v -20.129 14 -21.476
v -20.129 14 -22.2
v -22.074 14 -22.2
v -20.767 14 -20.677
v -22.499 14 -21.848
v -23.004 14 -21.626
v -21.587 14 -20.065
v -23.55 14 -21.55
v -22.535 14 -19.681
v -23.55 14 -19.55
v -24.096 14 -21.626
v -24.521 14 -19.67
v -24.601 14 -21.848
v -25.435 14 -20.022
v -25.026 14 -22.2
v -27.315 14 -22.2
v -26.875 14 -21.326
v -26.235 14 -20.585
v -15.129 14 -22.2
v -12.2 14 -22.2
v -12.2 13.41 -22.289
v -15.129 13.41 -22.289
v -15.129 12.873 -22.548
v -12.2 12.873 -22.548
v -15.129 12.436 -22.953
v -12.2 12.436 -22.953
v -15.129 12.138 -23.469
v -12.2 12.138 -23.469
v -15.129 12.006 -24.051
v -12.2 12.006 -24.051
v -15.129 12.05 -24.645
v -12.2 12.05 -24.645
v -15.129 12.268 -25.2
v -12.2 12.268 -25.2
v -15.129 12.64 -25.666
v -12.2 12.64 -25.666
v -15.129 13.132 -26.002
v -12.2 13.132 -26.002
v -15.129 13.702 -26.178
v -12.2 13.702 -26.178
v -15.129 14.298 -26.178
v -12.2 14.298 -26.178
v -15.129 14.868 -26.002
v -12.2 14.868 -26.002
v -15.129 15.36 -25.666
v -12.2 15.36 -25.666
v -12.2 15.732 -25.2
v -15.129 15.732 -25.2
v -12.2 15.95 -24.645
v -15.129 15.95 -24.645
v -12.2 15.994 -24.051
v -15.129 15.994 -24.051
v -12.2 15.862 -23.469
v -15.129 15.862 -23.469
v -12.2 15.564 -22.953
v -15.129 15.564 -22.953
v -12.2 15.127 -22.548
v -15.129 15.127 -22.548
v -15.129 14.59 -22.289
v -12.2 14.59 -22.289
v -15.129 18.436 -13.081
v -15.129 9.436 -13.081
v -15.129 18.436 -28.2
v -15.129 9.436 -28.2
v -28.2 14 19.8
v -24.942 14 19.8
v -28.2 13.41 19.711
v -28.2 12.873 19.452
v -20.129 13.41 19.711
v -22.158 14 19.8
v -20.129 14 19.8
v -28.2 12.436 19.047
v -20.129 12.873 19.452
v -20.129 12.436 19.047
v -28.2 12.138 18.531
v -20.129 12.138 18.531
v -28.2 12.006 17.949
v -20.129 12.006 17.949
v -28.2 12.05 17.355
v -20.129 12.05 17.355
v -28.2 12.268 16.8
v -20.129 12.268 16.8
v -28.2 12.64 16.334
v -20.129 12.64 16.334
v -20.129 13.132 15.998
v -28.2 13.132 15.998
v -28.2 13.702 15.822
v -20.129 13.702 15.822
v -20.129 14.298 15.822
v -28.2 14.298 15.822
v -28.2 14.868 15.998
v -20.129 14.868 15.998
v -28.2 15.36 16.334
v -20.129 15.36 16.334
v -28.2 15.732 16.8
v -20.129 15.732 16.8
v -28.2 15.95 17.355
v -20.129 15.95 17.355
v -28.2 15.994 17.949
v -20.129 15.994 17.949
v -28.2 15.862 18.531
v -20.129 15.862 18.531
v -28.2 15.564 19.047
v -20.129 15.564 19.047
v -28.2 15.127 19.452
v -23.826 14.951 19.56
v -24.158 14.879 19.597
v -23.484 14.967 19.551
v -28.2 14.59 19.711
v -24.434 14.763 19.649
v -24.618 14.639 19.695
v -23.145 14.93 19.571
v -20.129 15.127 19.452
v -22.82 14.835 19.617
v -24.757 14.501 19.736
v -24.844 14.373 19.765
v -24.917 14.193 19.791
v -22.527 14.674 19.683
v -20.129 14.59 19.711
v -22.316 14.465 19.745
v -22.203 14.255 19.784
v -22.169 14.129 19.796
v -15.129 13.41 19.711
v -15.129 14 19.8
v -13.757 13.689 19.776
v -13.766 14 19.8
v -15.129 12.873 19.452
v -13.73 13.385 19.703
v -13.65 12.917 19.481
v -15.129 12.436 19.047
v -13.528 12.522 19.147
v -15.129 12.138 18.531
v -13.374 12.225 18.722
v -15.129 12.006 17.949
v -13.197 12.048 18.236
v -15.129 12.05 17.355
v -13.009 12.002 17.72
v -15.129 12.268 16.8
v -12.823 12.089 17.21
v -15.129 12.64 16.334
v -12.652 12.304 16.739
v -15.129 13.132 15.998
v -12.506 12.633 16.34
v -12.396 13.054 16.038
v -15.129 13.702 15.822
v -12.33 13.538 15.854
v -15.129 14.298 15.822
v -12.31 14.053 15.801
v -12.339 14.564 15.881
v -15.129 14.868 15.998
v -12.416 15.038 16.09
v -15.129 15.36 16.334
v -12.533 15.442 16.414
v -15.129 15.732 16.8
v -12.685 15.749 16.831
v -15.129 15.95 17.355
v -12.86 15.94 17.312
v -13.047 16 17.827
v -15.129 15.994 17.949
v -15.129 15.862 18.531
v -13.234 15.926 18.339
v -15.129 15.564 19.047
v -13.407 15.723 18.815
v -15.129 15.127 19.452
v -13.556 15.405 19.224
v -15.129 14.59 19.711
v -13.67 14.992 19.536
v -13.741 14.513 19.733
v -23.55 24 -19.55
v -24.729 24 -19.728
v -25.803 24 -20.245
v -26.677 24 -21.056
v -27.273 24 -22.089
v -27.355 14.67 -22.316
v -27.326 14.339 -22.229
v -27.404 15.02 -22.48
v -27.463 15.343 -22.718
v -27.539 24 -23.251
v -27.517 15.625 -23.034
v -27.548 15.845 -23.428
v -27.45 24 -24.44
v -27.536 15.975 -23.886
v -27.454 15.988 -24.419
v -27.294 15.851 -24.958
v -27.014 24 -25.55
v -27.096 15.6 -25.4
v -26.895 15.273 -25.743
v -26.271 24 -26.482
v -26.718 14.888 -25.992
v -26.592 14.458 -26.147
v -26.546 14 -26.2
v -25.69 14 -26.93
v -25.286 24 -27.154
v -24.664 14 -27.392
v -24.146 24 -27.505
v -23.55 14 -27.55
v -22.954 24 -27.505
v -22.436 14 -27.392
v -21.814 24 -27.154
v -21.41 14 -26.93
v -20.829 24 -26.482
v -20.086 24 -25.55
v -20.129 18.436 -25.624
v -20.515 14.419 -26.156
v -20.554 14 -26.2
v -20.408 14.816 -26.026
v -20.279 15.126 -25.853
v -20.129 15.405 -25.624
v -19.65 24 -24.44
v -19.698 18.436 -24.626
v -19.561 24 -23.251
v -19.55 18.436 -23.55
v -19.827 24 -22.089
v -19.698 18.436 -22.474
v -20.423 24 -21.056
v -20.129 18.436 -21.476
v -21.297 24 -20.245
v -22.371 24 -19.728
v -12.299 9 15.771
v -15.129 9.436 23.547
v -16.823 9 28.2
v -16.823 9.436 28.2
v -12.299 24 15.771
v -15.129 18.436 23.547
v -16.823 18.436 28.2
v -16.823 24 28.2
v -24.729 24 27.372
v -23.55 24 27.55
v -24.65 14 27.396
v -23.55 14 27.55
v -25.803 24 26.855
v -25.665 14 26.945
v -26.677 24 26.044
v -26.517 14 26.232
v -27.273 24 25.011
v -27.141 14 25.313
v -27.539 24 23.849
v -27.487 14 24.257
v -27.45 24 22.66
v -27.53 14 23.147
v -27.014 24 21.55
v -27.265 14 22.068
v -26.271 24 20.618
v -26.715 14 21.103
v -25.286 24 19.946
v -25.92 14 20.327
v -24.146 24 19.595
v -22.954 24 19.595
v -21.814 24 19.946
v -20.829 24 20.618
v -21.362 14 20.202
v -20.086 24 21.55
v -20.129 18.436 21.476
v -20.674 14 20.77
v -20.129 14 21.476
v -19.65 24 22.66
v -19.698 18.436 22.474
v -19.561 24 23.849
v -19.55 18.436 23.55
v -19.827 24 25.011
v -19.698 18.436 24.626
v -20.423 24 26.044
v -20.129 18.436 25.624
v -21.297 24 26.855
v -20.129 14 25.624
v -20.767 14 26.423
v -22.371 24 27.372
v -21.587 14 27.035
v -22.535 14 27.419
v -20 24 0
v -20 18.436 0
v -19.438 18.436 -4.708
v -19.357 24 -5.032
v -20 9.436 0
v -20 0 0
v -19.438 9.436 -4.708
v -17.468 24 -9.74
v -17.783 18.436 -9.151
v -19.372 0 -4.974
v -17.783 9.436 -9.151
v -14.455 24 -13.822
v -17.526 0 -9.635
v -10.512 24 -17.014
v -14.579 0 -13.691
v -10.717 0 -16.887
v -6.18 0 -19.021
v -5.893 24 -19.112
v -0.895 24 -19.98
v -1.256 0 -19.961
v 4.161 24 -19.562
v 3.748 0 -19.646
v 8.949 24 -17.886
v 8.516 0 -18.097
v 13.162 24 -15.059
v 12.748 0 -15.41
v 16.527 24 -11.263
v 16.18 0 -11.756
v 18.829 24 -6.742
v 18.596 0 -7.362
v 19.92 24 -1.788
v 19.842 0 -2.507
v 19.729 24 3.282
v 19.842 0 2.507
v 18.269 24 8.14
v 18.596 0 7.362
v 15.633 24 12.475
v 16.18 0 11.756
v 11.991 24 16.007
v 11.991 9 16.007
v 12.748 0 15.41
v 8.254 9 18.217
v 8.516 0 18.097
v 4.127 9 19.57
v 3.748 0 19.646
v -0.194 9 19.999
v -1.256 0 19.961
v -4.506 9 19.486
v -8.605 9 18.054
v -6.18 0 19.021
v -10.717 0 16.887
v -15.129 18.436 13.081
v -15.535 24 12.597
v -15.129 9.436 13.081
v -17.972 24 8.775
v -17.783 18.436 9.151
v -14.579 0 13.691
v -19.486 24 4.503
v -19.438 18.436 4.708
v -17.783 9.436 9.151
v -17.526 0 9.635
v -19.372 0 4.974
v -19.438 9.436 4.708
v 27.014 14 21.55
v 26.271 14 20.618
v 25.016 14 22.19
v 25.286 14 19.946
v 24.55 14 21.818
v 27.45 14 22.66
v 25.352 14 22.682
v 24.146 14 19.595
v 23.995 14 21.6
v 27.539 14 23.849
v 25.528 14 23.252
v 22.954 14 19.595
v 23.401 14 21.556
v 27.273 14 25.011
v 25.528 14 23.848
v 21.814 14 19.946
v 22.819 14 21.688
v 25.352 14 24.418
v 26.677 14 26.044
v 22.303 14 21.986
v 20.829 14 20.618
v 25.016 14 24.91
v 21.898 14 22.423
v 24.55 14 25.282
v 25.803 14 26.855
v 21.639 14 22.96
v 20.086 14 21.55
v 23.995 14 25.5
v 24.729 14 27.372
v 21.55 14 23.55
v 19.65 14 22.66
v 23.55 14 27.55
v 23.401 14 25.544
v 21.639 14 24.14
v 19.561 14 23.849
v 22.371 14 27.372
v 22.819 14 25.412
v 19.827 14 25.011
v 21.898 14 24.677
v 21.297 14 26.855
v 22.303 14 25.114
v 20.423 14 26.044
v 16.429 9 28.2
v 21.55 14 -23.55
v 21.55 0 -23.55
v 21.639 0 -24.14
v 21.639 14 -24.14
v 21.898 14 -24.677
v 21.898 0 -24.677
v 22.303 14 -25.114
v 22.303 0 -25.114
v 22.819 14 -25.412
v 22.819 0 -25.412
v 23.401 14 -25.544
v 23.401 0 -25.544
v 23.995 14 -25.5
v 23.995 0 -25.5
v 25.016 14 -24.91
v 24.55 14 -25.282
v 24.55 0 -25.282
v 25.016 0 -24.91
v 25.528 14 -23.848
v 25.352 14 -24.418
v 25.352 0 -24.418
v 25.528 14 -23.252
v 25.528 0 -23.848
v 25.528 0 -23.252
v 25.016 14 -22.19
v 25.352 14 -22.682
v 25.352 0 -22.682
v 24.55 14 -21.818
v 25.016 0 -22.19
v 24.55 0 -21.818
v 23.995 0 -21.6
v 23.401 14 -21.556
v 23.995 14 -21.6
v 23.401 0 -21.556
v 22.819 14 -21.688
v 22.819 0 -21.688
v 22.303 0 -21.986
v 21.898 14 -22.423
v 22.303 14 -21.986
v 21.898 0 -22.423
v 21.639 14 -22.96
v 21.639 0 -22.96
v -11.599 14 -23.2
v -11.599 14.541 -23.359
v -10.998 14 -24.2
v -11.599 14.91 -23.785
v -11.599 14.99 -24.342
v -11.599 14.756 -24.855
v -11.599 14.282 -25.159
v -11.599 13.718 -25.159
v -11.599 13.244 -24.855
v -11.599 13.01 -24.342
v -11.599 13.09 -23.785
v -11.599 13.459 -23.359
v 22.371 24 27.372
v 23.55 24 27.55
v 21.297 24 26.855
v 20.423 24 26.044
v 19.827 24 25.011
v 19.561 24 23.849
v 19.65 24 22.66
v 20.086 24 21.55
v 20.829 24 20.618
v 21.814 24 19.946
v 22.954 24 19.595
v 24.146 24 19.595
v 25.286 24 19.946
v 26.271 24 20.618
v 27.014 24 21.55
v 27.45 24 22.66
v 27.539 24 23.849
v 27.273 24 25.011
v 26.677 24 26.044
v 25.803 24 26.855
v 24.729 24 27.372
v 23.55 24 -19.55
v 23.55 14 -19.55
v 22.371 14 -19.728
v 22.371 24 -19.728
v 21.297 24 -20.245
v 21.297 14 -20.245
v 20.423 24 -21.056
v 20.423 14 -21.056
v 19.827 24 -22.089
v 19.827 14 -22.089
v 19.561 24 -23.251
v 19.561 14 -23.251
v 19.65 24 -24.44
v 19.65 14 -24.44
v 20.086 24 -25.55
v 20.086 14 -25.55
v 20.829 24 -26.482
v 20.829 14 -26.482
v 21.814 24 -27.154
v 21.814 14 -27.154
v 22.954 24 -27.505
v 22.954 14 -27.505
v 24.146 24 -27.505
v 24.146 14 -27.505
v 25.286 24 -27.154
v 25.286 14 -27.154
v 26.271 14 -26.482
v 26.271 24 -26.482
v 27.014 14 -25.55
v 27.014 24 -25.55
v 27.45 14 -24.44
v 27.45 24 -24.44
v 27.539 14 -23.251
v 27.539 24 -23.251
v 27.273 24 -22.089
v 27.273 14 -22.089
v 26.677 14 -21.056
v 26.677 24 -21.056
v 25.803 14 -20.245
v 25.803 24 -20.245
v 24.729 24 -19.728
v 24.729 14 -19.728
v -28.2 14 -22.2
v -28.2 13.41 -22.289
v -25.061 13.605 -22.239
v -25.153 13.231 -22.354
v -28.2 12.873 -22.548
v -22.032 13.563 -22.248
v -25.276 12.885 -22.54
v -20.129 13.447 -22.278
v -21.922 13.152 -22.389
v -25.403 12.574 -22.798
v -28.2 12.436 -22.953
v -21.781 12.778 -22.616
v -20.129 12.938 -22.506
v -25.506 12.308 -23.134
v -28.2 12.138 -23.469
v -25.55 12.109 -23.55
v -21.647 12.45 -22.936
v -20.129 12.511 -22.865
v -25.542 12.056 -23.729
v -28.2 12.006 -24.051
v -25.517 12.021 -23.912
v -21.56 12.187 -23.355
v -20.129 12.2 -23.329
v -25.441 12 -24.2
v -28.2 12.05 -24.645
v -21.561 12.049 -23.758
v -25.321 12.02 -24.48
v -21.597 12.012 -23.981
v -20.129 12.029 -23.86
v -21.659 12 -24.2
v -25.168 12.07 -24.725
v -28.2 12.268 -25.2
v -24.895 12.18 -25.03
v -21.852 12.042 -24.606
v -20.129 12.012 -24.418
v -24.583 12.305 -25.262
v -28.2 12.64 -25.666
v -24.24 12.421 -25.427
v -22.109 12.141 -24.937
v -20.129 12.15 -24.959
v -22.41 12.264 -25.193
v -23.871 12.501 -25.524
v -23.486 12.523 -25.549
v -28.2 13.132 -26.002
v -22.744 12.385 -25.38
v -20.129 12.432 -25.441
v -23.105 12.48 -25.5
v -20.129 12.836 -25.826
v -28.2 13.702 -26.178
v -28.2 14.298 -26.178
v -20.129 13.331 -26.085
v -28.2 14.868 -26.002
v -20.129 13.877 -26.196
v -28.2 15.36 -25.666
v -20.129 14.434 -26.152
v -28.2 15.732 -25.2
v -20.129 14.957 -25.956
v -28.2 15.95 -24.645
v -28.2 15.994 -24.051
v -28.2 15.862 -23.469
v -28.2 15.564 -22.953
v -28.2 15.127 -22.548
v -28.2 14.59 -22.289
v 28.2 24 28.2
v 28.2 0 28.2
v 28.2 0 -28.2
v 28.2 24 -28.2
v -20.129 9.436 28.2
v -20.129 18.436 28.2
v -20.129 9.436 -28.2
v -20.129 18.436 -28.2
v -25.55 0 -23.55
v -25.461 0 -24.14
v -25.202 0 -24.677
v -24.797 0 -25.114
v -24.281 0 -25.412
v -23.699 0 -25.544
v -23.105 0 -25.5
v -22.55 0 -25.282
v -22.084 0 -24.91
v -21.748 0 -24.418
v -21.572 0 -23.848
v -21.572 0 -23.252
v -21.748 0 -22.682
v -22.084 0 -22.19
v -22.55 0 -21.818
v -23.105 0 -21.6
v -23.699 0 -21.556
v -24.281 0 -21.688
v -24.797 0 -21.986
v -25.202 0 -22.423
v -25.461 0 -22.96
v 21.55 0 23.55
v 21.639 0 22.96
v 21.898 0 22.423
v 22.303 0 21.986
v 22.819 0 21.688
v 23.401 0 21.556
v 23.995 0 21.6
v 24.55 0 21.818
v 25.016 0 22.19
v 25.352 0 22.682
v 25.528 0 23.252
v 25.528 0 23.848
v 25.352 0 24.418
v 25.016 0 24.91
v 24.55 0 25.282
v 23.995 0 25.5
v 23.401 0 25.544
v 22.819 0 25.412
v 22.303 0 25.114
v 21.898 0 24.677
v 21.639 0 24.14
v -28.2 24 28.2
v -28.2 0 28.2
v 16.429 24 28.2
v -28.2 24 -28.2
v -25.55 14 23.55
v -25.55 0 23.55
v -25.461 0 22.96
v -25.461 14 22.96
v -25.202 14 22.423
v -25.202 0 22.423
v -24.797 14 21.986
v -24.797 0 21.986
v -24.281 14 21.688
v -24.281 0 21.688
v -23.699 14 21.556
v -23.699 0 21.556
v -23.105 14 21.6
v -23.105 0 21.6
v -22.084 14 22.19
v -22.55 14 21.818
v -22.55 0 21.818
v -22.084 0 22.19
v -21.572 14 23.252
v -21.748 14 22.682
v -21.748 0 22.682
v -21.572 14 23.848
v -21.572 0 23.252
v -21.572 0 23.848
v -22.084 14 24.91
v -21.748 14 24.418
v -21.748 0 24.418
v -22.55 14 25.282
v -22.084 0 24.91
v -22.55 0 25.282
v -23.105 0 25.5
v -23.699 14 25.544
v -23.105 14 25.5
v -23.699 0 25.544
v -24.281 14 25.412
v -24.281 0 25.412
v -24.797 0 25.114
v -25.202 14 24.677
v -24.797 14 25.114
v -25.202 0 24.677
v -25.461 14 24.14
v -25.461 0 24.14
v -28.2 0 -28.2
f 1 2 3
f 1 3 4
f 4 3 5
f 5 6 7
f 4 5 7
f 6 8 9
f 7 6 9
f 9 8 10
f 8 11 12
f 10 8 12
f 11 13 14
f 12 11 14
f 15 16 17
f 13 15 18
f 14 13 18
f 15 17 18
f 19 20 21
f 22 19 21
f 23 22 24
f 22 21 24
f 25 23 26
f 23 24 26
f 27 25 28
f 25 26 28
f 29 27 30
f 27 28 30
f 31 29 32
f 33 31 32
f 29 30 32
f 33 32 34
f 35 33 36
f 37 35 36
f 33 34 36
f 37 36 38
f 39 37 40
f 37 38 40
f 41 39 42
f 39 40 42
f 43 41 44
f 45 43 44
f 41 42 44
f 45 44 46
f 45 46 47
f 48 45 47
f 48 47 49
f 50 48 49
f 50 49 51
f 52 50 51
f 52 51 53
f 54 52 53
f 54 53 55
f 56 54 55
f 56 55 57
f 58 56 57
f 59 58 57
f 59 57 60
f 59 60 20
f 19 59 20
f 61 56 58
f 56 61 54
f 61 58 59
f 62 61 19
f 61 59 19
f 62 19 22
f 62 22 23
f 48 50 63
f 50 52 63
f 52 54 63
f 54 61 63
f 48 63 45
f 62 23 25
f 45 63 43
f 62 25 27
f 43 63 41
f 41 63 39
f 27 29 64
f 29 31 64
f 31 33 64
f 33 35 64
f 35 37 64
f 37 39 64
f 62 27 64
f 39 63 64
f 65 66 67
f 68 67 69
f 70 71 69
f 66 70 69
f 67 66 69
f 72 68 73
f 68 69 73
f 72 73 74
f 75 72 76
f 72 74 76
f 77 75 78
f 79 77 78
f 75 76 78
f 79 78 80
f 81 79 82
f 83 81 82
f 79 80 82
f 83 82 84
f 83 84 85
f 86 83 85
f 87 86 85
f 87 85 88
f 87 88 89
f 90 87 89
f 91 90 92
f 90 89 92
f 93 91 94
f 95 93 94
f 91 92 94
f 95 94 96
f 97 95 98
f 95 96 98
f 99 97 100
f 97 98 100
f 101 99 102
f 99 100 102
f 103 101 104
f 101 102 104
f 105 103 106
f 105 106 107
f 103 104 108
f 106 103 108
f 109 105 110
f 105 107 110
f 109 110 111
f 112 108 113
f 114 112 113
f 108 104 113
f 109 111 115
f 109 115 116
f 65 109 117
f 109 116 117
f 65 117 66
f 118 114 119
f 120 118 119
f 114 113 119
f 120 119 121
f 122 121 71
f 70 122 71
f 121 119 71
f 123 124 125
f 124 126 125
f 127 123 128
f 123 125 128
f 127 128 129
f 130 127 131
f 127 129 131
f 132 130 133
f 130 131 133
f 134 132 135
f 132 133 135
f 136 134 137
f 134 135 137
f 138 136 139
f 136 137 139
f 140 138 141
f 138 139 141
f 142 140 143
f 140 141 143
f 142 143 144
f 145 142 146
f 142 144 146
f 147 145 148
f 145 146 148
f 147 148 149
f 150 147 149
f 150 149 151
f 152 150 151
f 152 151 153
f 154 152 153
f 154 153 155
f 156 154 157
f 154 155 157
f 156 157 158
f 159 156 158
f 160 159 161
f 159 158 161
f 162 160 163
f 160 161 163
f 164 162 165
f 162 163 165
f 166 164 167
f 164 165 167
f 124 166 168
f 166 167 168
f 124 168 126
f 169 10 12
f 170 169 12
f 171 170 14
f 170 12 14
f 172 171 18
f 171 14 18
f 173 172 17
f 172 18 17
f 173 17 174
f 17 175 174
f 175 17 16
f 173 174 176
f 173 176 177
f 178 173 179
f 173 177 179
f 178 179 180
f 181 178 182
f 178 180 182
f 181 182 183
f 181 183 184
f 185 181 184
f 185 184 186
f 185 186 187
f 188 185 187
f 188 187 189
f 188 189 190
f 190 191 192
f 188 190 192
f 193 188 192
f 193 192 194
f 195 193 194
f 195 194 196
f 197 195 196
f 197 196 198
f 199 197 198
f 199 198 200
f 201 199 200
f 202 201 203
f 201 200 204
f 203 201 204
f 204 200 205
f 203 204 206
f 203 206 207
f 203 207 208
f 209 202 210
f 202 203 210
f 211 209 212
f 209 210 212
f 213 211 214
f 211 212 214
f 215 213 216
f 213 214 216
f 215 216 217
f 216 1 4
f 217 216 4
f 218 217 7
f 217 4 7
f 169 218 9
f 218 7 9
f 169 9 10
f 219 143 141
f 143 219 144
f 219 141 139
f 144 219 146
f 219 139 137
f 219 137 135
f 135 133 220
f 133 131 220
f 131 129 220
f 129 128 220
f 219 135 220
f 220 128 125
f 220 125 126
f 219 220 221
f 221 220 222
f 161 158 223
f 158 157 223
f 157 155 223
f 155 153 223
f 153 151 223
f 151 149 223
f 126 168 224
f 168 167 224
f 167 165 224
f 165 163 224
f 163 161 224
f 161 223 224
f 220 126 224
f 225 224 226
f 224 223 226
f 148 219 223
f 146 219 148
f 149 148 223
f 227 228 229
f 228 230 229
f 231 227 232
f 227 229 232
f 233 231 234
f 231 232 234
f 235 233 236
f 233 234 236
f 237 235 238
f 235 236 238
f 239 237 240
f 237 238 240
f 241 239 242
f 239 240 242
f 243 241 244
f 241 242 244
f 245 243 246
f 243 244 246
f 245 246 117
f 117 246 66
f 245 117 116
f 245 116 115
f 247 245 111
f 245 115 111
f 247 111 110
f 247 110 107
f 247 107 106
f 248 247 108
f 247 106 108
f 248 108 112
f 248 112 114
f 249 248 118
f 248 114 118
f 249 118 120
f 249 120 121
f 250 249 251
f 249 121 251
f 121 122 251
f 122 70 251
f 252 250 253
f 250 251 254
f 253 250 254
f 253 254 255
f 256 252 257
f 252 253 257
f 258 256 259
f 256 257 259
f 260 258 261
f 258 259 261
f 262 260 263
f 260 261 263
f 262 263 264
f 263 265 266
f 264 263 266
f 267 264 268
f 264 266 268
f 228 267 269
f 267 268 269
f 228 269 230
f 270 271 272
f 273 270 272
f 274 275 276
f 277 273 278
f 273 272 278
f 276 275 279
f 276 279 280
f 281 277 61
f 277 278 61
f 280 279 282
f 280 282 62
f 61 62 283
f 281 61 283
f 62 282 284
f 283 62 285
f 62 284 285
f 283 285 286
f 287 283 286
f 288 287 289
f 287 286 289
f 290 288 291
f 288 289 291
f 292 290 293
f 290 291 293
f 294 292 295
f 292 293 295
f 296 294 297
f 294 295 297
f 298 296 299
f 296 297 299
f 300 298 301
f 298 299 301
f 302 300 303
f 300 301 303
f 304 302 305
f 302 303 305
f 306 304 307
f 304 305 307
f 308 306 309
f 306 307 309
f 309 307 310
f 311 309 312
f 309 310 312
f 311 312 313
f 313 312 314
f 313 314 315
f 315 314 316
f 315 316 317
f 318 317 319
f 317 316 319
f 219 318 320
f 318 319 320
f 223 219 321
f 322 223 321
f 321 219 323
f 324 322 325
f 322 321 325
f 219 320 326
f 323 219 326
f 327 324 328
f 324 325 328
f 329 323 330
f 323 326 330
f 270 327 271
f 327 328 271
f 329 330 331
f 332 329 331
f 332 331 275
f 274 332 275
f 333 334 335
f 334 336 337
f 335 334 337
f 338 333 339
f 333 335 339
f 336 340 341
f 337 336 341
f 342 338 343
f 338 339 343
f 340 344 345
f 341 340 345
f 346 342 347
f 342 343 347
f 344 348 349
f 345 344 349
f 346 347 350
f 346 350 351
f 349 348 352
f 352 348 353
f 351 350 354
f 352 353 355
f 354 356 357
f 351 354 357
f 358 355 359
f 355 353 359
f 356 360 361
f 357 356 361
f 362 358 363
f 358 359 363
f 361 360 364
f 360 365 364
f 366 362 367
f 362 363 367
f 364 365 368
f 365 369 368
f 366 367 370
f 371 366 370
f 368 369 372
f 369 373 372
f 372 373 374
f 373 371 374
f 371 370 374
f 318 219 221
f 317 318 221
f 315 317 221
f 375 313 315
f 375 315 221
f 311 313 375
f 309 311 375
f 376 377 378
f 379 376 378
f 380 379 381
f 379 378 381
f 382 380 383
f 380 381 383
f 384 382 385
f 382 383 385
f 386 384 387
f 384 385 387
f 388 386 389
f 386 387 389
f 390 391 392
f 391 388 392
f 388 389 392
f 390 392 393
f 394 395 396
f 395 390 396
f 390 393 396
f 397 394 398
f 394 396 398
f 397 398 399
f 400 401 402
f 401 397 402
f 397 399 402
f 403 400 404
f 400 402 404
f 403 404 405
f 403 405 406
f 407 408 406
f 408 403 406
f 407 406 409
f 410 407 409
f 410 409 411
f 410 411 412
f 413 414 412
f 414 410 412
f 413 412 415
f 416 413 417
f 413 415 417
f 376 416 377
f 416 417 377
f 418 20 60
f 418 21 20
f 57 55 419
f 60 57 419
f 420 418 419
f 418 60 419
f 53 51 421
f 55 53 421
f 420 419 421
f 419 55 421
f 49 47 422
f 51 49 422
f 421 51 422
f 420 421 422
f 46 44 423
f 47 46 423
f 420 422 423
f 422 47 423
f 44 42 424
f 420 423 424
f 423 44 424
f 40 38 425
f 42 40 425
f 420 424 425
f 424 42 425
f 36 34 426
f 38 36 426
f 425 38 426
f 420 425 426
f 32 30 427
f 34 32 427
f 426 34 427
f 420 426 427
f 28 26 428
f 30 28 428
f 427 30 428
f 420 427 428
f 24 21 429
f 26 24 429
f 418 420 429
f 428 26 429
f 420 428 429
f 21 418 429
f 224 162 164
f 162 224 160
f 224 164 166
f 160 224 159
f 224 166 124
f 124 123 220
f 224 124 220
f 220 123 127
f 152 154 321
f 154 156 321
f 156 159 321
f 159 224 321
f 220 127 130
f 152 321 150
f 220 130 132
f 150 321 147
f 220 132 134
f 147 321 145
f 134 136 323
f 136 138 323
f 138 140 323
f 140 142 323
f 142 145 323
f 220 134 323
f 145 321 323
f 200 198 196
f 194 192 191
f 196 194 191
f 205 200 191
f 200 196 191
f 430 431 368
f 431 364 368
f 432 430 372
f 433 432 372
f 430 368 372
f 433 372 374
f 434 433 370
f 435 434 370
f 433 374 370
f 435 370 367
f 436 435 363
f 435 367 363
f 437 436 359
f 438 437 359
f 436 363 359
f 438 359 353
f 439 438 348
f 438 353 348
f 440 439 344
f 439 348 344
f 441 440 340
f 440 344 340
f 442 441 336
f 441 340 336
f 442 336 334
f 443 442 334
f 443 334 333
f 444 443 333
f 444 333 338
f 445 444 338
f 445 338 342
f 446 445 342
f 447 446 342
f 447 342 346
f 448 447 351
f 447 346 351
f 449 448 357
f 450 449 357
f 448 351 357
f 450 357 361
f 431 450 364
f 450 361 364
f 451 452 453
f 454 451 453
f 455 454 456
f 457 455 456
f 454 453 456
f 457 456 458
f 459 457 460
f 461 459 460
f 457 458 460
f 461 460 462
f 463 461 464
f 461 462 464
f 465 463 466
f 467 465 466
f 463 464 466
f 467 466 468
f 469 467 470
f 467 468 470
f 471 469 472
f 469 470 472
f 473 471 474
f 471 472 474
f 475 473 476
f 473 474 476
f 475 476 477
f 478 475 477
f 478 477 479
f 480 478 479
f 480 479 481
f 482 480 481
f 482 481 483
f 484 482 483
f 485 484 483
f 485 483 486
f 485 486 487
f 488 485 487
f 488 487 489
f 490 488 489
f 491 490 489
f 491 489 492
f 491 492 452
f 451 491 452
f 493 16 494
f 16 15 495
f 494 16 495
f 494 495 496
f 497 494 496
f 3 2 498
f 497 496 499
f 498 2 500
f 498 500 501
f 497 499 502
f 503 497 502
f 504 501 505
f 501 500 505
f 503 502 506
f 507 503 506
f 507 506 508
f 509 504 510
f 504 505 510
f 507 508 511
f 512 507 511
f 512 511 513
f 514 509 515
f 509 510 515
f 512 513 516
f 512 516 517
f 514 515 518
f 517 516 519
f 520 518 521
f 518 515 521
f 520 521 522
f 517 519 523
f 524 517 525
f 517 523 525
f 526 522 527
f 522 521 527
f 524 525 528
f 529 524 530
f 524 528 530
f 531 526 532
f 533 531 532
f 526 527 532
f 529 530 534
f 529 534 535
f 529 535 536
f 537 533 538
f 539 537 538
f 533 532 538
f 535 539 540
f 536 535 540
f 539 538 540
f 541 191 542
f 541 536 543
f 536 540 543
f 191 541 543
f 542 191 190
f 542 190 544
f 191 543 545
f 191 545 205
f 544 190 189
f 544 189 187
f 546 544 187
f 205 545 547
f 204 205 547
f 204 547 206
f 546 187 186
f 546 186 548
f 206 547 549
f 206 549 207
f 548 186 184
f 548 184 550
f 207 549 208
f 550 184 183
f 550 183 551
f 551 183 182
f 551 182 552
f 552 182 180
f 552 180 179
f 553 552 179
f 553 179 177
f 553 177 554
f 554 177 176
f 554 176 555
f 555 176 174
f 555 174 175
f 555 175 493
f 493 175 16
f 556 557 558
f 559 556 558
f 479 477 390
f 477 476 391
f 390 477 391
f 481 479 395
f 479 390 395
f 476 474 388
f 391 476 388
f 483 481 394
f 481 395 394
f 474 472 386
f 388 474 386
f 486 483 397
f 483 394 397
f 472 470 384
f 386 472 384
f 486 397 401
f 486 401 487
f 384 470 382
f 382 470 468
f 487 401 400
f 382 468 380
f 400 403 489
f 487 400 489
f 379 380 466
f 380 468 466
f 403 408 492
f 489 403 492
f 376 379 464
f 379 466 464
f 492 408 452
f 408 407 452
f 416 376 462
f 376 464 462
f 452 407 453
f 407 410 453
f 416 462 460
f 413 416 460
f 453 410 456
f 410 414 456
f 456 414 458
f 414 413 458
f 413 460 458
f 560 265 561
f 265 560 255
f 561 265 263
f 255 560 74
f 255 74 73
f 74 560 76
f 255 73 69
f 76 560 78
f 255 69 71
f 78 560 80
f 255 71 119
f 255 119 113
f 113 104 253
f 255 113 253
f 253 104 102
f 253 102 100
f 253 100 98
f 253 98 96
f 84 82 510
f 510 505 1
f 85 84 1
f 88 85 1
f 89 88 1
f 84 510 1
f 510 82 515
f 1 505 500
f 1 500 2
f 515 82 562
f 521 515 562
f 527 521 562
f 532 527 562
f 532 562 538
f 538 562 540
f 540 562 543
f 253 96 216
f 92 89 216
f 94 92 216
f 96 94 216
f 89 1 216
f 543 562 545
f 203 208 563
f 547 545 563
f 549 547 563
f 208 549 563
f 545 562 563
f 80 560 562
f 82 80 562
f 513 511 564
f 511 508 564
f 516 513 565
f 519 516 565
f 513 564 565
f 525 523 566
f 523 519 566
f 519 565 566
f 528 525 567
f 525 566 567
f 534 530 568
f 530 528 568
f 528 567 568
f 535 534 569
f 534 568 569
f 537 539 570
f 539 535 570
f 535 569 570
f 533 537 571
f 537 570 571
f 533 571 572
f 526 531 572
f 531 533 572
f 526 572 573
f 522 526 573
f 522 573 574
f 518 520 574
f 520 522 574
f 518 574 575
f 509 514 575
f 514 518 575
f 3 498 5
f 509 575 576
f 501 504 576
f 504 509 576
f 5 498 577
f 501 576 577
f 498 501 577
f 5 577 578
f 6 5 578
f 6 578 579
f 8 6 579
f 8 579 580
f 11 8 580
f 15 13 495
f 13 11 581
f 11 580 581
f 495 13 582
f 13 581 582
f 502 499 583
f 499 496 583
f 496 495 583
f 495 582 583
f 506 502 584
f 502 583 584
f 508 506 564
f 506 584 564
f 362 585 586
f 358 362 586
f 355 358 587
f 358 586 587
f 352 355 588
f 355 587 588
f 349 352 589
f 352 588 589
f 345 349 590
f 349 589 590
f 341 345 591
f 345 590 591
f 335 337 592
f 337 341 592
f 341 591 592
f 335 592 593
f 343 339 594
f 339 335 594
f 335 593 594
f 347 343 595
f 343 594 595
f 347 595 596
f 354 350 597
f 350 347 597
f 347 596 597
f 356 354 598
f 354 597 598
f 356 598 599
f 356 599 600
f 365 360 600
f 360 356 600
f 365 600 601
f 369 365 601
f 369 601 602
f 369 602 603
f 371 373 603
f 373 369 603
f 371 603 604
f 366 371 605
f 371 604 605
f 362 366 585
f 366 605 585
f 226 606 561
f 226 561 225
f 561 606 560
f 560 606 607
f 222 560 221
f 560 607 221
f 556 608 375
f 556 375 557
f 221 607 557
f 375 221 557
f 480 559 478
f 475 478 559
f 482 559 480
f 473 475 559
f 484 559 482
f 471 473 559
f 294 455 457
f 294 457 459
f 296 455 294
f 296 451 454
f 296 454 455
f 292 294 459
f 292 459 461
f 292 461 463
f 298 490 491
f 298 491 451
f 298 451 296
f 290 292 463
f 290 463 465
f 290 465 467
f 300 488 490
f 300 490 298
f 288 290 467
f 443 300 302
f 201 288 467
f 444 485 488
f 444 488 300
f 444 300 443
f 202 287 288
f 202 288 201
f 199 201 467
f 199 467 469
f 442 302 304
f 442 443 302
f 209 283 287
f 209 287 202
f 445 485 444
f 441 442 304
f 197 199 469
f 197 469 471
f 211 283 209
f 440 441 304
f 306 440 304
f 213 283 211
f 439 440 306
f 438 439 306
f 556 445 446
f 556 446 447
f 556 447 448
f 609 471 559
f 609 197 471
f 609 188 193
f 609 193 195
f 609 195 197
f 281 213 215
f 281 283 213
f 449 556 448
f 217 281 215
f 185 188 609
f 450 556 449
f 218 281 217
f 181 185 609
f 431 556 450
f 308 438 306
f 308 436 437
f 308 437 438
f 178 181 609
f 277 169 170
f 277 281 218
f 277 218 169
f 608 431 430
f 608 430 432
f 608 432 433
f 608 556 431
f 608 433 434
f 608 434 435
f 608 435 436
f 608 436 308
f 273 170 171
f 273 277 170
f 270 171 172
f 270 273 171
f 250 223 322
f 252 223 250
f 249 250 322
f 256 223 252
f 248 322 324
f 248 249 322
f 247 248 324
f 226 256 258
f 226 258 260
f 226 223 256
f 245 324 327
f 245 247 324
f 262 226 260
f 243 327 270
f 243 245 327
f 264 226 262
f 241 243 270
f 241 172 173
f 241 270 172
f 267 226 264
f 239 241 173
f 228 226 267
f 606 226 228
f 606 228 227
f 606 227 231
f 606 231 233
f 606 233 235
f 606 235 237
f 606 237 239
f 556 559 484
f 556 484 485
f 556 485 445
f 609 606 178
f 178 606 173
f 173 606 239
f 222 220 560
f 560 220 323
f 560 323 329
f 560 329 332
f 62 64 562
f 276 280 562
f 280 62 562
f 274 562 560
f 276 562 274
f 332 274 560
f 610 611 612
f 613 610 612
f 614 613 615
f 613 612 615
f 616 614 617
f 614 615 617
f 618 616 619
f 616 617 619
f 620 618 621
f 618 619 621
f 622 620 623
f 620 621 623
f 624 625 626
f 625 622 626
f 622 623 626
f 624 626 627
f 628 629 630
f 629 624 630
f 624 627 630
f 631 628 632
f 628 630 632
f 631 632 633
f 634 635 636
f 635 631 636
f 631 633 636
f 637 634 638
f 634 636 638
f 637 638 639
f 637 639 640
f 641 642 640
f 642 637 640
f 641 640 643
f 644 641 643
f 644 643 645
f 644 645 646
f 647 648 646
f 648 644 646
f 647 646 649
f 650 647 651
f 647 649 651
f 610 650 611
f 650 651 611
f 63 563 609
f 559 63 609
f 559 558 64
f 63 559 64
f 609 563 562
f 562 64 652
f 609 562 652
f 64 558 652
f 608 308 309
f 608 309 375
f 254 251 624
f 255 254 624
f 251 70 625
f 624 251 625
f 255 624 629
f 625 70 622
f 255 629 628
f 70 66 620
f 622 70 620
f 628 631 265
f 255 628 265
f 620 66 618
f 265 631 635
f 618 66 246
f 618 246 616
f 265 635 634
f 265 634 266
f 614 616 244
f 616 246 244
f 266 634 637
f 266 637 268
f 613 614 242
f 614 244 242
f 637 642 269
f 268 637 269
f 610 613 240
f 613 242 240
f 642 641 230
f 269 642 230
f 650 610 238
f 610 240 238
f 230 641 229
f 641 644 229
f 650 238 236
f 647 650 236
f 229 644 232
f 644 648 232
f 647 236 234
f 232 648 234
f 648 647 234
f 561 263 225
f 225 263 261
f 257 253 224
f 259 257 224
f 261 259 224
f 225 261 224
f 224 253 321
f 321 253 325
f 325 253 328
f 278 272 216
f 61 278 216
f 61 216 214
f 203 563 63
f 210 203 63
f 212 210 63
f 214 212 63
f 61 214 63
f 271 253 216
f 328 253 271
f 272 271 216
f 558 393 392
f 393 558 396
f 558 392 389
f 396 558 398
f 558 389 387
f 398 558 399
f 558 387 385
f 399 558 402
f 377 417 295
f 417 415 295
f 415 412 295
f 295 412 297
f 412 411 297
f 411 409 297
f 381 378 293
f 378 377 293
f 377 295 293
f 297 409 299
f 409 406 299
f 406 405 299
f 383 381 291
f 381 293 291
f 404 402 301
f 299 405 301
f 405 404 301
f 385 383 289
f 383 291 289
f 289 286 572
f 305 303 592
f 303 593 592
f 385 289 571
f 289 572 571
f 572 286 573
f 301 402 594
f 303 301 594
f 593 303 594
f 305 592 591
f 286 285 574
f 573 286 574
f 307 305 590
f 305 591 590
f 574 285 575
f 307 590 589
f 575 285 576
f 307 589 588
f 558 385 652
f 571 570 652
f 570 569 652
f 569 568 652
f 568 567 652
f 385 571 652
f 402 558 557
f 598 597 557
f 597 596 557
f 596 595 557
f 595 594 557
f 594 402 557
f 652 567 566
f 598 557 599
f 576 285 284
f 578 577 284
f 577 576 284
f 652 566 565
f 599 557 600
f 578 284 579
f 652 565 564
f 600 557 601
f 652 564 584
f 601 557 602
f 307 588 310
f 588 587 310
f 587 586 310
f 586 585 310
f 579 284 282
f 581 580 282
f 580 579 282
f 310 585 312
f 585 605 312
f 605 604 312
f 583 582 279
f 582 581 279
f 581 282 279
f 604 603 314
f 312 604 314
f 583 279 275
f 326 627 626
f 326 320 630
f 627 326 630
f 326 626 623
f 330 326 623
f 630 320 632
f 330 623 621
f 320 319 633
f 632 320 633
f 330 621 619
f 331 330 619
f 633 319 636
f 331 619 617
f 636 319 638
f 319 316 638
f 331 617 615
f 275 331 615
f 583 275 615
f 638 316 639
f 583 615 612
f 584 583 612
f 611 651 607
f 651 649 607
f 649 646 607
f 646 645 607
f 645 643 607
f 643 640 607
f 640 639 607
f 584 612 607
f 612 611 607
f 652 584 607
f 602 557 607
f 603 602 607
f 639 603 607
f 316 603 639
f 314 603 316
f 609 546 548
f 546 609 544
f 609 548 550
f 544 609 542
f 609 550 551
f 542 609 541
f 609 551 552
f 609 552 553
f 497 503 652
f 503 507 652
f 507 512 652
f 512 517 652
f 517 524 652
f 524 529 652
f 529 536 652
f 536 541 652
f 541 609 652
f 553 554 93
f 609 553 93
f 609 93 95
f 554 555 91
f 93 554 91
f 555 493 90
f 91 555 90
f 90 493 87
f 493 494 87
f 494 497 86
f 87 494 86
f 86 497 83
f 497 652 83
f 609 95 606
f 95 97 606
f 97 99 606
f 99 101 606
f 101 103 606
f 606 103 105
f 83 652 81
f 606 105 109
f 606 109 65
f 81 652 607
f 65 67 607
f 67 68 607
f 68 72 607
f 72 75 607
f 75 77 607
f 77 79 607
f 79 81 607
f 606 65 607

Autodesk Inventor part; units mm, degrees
ref_plane "YZ Plane" through (0, 0, 0) normal (1, 0, 0) x (0, 1, 0)
ref_plane "XZ Plane" through (0, 0, 0) normal (0, 1, 0) x (-1, 0, 0)
ref_plane "XY Plane" through (0, 0, 0) normal (0, 0, 1) x (1, 0, 0)
sketch "Sketch1" plane through (0, 0, 0) normal (0, 1, 0) x (-1, 0, 0)
  line L0 (-28.2, -28.2) -> (28.2, -28.2)
  line L1 (28.2, -28.2) -> (28.2, 28.2)
  line L2 (28.2, 28.2) -> (-28.2, 28.2)
  line L3 (-28.2, 28.2) -> (-28.2, -28.2)
  line L4 (-28.2, -28.2) -> (28.2, 28.2) construction
  line L5 (28.2, -28.2) -> (-28.2, 28.2) construction
  line L6 (-23.55, 23.55) -> (23.55, 23.55) construction
  line L7 (23.55, 23.55) -> (23.55, -23.55) construction
  line L8 (23.55, -23.55) -> (-23.55, -23.55) construction
  line L9 (-23.55, -23.55) -> (-23.55, 23.55) construction
  line L10 (-23.55, 23.55) -> (23.55, -23.55) construction
  line L11 (23.55, 23.55) -> (-23.55, -23.55) construction
  circle A0 centre (23.55, 23.55) radius 2
  circle A1 centre (23.55, -23.55) radius 2
  circle A2 centre (-23.55, -23.55) radius 2
  circle A3 centre (-23.55, 23.55) radius 2
  circle A4 centre (0, 0) radius 20
  line L12 (28.2, 28.2) -> (-28.2, 28.2)
  line L13 (-28.2, 28.2) -> (-28.2, 38.2)
  line L14 (-28.2, 38.2) -> (28.2, 38.2)
  line L15 (28.2, 38.2) -> (28.2, 28.2)
  dimension "d0" = 56.4
  dimension "d1" = 56.4
  dimension "d2" = 47.1
  dimension "d3" = 47.1
  dimension "d4" = 4
  dimension "d5" = 4
  dimension "d6" = 4
  dimension "d7" = 4
  dimension "d8" = 40
  dimension "d16" = 10
extrude "Extrusion1" add sketch "Sketch1" along normal blind 24 contours L3 L2 L1 L0
sketch "Sketch2" plane through (0, 24, 0) normal (0, 1, 0) x (1, 0, 0)
  circle A0 centre (0, 0) radius 20 projected
  circle A1 centre (23.55, -23.55) radius 2 projected
  circle A2 centre (23.55, 23.55) radius 2 projected
  circle A3 centre (-23.55, 23.55) radius 2 projected
  circle A4 centre (-23.55, -23.55) radius 2 projected
  line L0 (28.2, 28.2) -> (-28.2, 28.2) projected
  line L1 (-28.2, 28.2) -> (-28.2, -28.2) projected
  line L2 (28.2, -28.2) -> (28.2, 28.2) projected
  circle A5 centre (0, 0) radius 6.5
  line L3 (-6.4978, 0.1686) -> (-26.2939, -54.2207)
  line L4 (-6.4978, 0.1686) -> (51.3822, 0.1686) construction
  line L5 (6.4521, -0.788) -> (25.9, -54.2207)
  line L6 (6.4521, -0.788) -> (63.314, -0.788) construction
  line L7 (25.9, -54.2207) -> (-26.2939, -54.2207)
  line L8 (-28.2, -28.2) -> (28.2, -28.2) projected
  dimension "d11" = 110
  dimension "d12" = 70
  dimension "d13" = 13
extrude "Extrusion2" cut sketch "Sketch2" against normal blind 15 contours L3 A5 L5 A0 | A0 L5 L8 L3 | A5 | L8 L5 L7 L3 picked at (-8.2958, -12.9873)
sketch "Sketch3" plane through (-28.2, 0, -28.2) normal (-1, 0, 0) x (0, 0, 1)
  line L0 (0, 0) -> (56.4, 0) projected
  line L1 (0, 24) -> (56.4, 24) projected
  line L2 (0, 0) -> (0, 24) projected
  line L3 (49.75, 24) -> (53.75, 24) projected
  line L4 (53.75, 0) -> (49.75, 0) projected
  line L5 (2.65, 24) -> (6.65, 24) projected
  line L6 (6.65, 0) -> (2.65, 0) projected
  line L7 (6.65, 0) -> (6.65, 24) projected
  line L8 (2.65, 0) -> (2.65, 24) projected
  line L9 (49.75, 0) -> (49.75, 24) projected
  line L10 (53.75, 0) -> (53.75, 24) projected
  line L11 (56.4, 0) -> (56.4, 24) projected
  point P0 (28.2, 0)
sketch "Sketch4" plane through (-28.2, 0, -28.2) normal (-1, 0, 0) x (0, 0, 1)
  line L0 (0, 0) -> (56.4, 0) projected
  line L1 (0, 24) -> (56.4, 24) projected
  line L2 (0, 0) -> (0, 24) projected
  circle A0 centre (4, 14) radius 2.5
  circle A1 centre (46, 14) radius 2.5
  line L3 (4.5098, 0) -> (4.5098, 24) construction
  line L4 (0, 24) -> (66.4, 24) construction
  line L5 (56.4, 0) -> (56.4, 24) projected
  point P0 (28.2, 0)
  dimension "d17" = 5
  dimension "d18" = 5
  dimension "d19" = 4.5098
  dimension "d20" = 4
  dimension "d21" = 14
  dimension "d22" = 0
  dimension "d23" = 42
hole "Hole1" at (-28.2, 14, -24.2) at (-28.2, 14, 17.8) direction (1, 0, 0) diameter 4 depth 16 tip angle 118
sketch "Sketch5" plane through (0, 24, 0) normal (0, 1, 0) x (1, 0, 0)
  line L0 (-16.8232, -28.2) -> (-12.2994, -15.771) projected
  arc A0 (11.9912, -16.0066) -> (-12.2994, -15.771) centre (0, 0) ccw projected
  line L1 (11.9912, -16.0066) -> (16.4292, -28.2) projected
  line L2 (28.2, -28.2) -> (28.2, 28.2) projected
  line L3 (28.2, 28.2) -> (-28.2, 28.2) projected
  line L4 (-28.2, 28.2) -> (-28.2, -28.2) projected
  circle A1 centre (23.55, -23.55) radius 2 projected
  circle A2 centre (23.55, 23.55) radius 2 projected
  circle A3 centre (-23.55, 23.55) radius 2 projected
  circle A4 centre (-23.55, -23.55) radius 2 projected
  line L5 (16.4292, -28.2) -> (28.2, -28.2) projected
  line L6 (-28.2, -28.2) -> (-16.8232, -28.2) projected
hole "Hole2" at (-23.55, 24, 23.55) at (-23.55, 24, -23.55) at (23.55, 24, -23.55) at (23.55, 24, 23.55) direction (0, -1, 0) diameter 4 depth 12 tip angle 118 counterbore diameter 8 counterbore depth 10
sketch "Sketch6" plane through (28.2, 0, -28.2) normal (0, 0, -1) x (-1, 0, 0)
  line L0 (41.2379, 16) -> (56.4, 16) projected
  line L1 (40.4, 12) -> (56.4, 12) projected
  line L2 (48.3294, 18.4358) -> (43.3294, 18.4358)
  line L3 (43.3294, 18.4358) -> (43.3294, 9.4358)
  line L4 (43.3294, 9.4358) -> (48.3294, 9.4358)
  line L5 (48.3294, 9.4358) -> (48.3294, 18.4358)
  line L6 (48.3294, 18.4358) -> (43.3294, 9.4358) construction
  line L7 (43.3294, 18.4358) -> (48.3294, 9.4358) construction
  point P0 (28.2, 0)
  point P1 (45.8294, 13.9358)
  dimension "d38" = 9
  dimension "d39" = 5
extrude "Extrusion3" cut sketch "Sketch6" against normal through all
properties part number "00_NEMA23_holder"
